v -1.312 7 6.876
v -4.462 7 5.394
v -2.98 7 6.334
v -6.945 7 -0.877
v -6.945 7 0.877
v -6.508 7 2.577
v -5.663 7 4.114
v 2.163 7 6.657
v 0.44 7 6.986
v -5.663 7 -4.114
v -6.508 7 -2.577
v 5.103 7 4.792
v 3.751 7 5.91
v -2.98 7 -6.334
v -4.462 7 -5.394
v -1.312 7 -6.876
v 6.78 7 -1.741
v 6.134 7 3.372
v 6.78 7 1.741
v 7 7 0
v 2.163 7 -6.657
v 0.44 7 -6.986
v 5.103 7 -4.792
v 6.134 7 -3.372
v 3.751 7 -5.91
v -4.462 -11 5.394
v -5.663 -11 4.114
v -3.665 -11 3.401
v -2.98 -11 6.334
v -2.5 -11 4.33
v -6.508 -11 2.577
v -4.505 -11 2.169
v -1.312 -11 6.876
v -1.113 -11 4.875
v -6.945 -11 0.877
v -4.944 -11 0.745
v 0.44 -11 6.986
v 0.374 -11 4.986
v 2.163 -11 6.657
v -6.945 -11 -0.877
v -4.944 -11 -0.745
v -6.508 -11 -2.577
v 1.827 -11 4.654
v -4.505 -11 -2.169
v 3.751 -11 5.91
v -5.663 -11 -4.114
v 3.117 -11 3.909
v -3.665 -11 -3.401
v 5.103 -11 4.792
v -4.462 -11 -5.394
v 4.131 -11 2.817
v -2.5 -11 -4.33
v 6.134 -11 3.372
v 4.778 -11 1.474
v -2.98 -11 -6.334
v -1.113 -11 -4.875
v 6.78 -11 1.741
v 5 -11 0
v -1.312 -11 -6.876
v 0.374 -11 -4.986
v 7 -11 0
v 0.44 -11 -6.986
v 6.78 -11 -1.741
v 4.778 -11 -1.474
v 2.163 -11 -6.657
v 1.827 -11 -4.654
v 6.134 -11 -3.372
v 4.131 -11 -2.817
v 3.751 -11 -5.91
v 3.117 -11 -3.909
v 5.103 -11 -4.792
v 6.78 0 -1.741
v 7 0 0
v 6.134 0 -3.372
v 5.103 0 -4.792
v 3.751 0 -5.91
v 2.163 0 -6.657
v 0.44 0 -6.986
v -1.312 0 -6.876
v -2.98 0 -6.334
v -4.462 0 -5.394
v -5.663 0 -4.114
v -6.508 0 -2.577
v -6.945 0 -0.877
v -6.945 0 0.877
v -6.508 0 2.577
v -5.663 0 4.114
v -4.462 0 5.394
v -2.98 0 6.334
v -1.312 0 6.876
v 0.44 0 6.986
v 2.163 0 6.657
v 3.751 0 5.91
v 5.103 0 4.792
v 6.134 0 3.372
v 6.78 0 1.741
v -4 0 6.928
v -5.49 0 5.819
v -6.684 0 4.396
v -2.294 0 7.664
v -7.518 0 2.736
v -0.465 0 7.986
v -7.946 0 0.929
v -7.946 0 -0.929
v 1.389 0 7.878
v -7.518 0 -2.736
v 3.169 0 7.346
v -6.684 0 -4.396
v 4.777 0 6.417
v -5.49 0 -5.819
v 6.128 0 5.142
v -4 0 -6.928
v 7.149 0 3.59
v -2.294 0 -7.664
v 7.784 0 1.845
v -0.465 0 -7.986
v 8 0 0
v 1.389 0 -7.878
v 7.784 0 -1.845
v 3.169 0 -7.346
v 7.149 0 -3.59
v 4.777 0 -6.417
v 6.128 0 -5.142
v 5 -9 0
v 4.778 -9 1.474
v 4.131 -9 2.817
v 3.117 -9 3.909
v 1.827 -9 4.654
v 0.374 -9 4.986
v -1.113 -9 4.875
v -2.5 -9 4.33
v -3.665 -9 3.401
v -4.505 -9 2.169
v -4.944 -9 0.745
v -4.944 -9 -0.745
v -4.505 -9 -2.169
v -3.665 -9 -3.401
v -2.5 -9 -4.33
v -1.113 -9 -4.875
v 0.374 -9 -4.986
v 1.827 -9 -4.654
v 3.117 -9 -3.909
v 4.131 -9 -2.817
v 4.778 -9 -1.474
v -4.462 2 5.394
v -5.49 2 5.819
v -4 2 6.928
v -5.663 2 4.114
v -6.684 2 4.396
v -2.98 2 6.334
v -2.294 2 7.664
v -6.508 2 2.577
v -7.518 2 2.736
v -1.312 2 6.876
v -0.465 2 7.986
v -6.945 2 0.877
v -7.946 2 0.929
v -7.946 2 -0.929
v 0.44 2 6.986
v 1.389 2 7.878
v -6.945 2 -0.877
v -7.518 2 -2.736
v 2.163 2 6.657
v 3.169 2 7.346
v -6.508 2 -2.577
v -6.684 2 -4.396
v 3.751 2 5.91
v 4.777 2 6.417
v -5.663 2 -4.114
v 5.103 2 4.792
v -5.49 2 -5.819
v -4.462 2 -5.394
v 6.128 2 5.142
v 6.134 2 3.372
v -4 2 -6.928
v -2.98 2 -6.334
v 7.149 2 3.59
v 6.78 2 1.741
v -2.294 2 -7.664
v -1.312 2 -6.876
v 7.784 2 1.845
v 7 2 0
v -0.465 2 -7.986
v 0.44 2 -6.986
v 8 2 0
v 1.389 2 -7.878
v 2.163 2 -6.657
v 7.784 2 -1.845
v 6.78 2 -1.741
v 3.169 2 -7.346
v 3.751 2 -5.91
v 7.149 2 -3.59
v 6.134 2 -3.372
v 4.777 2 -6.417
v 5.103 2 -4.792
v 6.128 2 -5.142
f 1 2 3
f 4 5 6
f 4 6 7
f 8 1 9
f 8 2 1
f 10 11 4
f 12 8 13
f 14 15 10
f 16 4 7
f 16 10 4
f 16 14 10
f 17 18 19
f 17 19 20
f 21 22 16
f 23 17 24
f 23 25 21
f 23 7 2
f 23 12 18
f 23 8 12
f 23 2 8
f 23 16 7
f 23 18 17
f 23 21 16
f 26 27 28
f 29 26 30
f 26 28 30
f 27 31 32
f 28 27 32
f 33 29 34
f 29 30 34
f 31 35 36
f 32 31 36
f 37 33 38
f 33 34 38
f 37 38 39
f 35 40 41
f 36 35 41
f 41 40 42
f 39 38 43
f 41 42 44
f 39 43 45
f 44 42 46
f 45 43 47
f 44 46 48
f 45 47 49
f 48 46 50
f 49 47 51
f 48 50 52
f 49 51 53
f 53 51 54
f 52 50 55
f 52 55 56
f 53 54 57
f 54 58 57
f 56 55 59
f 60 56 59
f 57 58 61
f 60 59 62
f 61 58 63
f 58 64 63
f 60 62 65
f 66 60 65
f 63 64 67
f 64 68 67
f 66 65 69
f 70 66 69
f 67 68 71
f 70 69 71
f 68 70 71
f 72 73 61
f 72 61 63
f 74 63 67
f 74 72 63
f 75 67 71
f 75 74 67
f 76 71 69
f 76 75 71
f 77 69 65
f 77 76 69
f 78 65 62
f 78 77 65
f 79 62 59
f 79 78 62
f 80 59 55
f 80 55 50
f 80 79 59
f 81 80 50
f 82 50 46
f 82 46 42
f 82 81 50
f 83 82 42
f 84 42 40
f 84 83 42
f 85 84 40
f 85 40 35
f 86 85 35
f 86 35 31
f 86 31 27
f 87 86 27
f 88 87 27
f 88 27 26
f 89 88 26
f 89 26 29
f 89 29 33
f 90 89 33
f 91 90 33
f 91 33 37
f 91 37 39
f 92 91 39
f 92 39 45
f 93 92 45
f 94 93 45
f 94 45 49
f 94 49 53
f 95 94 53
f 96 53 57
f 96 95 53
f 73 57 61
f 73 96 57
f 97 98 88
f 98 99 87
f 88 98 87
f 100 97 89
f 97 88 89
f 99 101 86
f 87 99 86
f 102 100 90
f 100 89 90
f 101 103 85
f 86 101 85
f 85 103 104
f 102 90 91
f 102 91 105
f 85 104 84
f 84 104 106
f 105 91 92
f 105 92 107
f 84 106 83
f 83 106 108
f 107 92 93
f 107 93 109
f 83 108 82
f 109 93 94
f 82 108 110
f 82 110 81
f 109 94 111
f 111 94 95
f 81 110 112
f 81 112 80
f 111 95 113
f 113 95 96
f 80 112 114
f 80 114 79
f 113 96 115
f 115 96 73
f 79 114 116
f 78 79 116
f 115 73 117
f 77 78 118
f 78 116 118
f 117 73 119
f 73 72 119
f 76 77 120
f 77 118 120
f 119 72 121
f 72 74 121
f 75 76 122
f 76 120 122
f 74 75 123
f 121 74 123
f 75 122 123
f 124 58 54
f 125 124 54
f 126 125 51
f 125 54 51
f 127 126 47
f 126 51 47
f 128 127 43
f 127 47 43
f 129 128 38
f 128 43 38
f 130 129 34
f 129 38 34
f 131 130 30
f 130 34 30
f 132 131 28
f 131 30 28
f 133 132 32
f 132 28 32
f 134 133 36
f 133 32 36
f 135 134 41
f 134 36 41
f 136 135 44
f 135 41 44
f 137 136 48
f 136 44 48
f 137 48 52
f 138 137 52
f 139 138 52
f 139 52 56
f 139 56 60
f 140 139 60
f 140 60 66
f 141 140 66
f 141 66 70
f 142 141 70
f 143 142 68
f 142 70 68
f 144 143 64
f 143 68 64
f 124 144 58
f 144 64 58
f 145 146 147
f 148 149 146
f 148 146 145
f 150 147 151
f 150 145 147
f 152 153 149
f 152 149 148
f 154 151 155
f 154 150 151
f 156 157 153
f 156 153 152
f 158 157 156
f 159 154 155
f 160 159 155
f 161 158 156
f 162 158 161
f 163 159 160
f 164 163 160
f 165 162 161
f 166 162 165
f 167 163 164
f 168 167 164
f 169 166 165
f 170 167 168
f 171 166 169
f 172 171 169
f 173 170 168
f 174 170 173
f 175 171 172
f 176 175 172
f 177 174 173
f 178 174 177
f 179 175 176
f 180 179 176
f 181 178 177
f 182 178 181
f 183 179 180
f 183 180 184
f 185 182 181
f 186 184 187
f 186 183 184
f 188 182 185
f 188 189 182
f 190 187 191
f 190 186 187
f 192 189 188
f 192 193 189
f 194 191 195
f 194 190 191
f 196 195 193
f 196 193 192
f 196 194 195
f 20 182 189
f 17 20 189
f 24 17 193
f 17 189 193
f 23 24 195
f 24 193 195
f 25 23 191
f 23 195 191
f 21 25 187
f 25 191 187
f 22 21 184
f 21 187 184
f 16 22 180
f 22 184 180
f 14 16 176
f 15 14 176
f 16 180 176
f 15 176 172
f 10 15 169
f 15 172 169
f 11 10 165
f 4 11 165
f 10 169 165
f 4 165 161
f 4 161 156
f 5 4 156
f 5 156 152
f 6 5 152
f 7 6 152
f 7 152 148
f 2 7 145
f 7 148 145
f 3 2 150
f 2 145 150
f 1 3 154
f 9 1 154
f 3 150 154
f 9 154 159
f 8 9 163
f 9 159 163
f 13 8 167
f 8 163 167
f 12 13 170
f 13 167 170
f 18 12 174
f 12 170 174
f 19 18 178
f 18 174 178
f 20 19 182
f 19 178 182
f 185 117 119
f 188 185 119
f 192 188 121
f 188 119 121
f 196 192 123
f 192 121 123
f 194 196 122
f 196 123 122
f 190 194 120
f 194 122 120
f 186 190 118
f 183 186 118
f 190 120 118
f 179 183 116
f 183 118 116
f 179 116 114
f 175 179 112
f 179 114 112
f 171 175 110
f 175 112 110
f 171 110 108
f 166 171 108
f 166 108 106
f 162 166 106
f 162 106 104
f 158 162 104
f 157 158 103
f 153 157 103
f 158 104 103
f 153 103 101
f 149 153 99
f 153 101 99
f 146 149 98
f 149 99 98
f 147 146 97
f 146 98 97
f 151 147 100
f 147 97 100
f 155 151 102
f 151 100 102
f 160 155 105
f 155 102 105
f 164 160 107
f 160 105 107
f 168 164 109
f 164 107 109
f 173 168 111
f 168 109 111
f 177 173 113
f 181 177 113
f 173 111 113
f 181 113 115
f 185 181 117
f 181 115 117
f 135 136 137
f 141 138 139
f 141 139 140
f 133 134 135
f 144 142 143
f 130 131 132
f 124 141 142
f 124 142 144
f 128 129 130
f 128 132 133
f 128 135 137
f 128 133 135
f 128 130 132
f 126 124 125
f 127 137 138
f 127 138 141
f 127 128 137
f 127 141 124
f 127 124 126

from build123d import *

# Parameters (mm, degrees)
SKETCH1_R                = 8
BOSS_EXTRUDE1_DEPTH      = 2
SKETCH2_R                = 7
BOSS_EXTRUDE2_DEPTH      = 5
BOSS_EXTRUDE2_DEPTH_BACK = 13
SKETCH4_R                = 5
CUT_EXTRUDE2_DEPTH       = 2


with BuildPart() as part:
    # Sketch1 → Boss-Extrude1 (new body)
    with BuildSketch(Plane(origin=(0, 0, 0), x_dir=(1, 0, 0), z_dir=(0, 1, 0))):
        Circle(SKETCH1_R)
    extrude(amount=BOSS_EXTRUDE1_DEPTH)

    # Sketch2 → Boss-Extrude2 (add, two sides)
    with BuildSketch(Plane(origin=(0, 2, 0), x_dir=(1, 0, 0), z_dir=(0, 1, 0))) as boss_extrude2_sk:
        Circle(SKETCH2_R)
    extrude(amount=BOSS_EXTRUDE2_DEPTH)
    extrude(boss_extrude2_sk.sketch, amount=-BOSS_EXTRUDE2_DEPTH_BACK)

    # Sketch4 → Cut-Extrude2 (cut)
    with BuildSketch(Plane.XZ.offset(11)):
        Circle(SKETCH4_R)
    extrude(amount=-CUT_EXTRUDE2_DEPTH, mode=Mode.SUBTRACT)


solid = part.part
